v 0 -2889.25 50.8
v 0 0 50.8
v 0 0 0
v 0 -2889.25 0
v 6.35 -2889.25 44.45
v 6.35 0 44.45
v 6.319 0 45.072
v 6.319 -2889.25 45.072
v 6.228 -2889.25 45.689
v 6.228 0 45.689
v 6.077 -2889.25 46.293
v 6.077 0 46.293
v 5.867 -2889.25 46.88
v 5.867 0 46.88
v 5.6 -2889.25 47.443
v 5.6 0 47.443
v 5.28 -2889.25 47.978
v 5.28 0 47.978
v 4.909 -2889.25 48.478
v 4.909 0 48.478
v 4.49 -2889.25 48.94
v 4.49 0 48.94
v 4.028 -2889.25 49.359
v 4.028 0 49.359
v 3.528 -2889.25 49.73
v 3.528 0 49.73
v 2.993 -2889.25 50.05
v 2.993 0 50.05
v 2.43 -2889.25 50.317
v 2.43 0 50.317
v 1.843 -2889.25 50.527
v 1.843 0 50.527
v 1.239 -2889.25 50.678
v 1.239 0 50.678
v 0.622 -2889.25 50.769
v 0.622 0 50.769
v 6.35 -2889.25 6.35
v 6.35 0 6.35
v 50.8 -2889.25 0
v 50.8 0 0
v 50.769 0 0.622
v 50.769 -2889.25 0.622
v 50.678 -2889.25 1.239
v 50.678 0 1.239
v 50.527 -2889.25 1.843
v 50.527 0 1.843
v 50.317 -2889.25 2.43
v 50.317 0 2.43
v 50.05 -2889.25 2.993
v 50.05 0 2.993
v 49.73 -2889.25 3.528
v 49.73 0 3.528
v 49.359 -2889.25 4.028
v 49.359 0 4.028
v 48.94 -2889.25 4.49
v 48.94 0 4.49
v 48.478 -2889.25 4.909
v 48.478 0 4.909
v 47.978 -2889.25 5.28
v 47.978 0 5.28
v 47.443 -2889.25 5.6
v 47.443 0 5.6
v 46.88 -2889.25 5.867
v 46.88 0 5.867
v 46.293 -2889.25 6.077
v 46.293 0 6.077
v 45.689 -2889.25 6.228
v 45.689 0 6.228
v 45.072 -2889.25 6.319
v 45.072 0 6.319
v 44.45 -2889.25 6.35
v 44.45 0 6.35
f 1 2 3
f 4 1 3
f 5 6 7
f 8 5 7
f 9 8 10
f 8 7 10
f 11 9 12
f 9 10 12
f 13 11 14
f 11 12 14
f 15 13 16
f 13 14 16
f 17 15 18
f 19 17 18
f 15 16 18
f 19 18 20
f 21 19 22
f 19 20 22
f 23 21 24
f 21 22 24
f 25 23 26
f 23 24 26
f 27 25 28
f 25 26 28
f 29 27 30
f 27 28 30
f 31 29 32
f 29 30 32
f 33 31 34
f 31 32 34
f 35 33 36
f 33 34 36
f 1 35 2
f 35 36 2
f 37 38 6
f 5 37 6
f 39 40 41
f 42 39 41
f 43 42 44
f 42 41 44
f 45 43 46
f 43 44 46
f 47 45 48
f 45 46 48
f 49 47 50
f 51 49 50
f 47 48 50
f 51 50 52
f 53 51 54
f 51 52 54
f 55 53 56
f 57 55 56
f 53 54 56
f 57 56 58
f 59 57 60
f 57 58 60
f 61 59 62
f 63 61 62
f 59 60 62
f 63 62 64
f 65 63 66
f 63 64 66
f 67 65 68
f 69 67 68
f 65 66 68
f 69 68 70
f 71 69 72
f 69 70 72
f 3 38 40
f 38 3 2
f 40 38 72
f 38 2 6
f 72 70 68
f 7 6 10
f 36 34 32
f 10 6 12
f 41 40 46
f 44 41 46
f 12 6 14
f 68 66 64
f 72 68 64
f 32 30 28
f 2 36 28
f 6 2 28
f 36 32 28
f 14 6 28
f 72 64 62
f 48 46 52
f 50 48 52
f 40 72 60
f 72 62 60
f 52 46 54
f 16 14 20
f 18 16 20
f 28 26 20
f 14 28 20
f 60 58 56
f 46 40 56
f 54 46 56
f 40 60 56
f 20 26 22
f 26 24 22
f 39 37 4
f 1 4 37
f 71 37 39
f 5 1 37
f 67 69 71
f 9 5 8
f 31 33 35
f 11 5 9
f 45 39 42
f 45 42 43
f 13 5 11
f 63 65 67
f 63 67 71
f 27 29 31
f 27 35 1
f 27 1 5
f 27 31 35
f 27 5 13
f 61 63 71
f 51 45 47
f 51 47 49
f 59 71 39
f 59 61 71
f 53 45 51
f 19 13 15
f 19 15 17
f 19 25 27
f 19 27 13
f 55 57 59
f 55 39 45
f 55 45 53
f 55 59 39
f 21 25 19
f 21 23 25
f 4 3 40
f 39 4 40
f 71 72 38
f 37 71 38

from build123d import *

# Parameters (mm, degrees)
F1_DEPTH = 2889.25


with BuildPart() as f1:
    # F0 (on Front) → F1 (new body)
    with BuildSketch(Plane.XZ):
        with BuildLine():
            Line((0, 50.8), (0, 0))
            Line((0, 0), (50.8, 0))
            ThreePointArc((50.8, 0), (48.940128, 4.490128), (44.45, 6.35))
            Line((44.45, 6.35), (6.35, 6.35))
            Line((6.35, 6.35), (6.35, 44.45))
            ThreePointArc((6.35, 44.45), (4.490128, 48.940128), (0, 50.8))
        make_face()
    extrude(amount=F1_DEPTH)


solid = f1.part
